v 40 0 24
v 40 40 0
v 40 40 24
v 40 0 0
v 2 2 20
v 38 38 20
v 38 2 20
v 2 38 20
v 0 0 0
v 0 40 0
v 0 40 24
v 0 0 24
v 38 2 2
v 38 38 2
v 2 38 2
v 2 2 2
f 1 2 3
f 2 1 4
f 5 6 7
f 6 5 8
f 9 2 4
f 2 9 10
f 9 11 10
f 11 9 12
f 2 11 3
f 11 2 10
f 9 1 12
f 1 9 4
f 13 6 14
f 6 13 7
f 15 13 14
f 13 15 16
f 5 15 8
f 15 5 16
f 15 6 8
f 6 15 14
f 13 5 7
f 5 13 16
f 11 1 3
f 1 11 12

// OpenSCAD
// file: parts/lid.scad
// SPDX-License-Identifier: CC-BY-NC-SA-4.0
// lid part — the box lid.
module lid() {
    cube([40, 40, 4]);
}

lid();
// file: parts/body.scad
// SPDX-License-Identifier: CC-BY-NC-SA-4.0
// body part — the box base.
module body() {
    difference() {
        cube([40, 40, 20]);
        translate([2, 2, 2]) cube([36, 36, 20]);
    }
}

body();
// main file
// SPDX-License-Identifier: CC-BY-NC-SA-4.0
// two-piece-box — multipart assembly with tuneable exploded view.
// Render: make render P=two-piece-box
use <parts/body.scad>;
use <parts/lid.scad>;

/* [Exploded View] */
explode = 0; // [0:0.01:1]

/* [Parts] */
show_body = true;
show_lid  = true;

// Each part offsets along its own vector scaled by `explode`
// (0 = assembled, 1 = fully exploded).
module assembly() {
    if (show_body) body();
    if (show_lid) translate([0, 0, 40] * explode) translate([0, 0, 20]) lid();
}

assembly();
